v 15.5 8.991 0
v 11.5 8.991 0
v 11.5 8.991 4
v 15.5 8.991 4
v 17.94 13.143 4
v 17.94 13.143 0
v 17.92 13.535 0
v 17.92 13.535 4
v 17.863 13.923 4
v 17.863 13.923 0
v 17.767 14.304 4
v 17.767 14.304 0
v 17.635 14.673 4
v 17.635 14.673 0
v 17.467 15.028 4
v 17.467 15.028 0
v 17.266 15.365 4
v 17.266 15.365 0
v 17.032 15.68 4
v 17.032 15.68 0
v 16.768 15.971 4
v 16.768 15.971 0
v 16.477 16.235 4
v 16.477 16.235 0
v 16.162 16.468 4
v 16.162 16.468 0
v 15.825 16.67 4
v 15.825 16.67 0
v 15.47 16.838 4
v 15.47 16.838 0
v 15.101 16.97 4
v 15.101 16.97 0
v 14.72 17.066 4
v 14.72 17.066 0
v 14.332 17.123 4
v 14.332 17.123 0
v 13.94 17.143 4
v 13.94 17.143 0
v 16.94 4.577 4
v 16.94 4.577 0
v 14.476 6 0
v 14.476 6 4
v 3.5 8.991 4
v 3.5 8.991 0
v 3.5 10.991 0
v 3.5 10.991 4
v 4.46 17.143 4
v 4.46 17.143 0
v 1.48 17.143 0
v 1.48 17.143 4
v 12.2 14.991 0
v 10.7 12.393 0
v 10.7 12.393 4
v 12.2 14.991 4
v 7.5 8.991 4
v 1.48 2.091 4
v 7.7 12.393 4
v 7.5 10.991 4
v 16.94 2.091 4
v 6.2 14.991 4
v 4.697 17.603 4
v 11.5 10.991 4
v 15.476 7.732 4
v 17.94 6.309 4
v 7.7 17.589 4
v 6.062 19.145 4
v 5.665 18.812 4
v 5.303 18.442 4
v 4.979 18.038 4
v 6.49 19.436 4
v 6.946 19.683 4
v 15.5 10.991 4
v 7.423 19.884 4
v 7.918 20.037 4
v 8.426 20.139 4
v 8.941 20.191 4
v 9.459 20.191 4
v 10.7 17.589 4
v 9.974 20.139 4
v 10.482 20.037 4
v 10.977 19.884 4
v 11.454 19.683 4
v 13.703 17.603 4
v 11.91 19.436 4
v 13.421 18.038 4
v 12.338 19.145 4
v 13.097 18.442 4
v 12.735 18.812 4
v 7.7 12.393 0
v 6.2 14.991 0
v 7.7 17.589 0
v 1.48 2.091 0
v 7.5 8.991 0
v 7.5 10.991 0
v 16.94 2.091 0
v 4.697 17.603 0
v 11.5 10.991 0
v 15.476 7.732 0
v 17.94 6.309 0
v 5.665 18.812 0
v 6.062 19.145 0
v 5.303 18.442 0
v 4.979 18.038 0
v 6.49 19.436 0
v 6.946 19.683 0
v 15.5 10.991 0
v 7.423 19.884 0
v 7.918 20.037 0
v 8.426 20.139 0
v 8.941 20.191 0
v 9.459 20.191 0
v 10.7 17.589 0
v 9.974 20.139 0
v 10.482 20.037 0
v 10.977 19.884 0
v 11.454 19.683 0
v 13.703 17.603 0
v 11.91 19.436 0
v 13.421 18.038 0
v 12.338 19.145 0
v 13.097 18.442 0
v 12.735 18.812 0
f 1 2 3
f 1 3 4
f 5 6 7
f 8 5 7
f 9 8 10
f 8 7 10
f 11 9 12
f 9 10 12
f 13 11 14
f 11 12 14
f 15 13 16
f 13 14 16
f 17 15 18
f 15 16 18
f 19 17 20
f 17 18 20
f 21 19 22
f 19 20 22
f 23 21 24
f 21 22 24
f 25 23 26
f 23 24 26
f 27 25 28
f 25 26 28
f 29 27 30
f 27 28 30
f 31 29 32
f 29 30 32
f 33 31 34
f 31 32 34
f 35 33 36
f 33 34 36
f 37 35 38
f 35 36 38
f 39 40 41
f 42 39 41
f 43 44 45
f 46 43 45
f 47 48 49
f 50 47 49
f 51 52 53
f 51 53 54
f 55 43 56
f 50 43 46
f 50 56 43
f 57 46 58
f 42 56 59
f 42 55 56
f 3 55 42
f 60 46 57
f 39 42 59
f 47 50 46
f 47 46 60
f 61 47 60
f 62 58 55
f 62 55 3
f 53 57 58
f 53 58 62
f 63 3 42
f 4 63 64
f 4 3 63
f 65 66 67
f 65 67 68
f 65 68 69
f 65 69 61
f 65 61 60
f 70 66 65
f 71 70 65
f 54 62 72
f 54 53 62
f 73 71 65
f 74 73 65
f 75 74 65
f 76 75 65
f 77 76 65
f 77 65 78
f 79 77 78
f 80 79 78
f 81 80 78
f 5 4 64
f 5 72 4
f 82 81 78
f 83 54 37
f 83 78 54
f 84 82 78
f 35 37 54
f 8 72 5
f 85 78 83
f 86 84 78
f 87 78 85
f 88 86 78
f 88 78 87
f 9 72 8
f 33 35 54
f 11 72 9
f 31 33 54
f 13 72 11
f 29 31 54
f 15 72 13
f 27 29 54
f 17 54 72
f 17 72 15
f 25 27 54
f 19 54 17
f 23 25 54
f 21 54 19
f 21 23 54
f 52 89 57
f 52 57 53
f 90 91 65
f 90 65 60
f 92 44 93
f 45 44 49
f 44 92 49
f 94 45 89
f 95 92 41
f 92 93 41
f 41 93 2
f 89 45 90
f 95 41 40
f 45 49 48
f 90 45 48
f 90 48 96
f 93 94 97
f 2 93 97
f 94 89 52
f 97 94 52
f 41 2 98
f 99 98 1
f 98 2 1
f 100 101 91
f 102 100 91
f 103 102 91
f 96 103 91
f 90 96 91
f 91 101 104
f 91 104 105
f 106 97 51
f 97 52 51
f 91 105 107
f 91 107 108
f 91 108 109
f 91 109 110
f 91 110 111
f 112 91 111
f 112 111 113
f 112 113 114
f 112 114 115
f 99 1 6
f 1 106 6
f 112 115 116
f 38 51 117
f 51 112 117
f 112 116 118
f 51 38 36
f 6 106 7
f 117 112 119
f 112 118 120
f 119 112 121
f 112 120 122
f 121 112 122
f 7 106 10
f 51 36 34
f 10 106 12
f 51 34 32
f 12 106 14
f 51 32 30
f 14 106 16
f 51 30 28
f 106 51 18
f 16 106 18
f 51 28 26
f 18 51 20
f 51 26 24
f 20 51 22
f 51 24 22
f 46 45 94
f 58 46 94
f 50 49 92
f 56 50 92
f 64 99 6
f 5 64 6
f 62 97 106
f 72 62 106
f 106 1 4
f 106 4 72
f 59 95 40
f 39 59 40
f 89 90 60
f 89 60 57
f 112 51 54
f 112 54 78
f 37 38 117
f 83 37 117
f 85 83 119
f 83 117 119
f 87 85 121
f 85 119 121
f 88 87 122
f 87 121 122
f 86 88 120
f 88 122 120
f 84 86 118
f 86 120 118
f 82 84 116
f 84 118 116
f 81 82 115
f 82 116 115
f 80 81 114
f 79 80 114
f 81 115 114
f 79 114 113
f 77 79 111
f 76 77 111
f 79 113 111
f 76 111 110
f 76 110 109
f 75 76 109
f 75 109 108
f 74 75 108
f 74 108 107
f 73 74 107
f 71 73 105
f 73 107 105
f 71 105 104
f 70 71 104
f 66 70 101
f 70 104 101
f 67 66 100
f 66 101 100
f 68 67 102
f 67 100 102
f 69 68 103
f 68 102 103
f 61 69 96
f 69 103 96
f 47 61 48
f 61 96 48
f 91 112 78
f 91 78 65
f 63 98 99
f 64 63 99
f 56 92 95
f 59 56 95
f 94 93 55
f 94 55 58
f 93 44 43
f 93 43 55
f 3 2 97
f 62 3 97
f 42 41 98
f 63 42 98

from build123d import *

# Parameters (mm, degrees)
SKETCH1_W           = 4
SKETCH1_H           = 2
BOSS_EXTRUDE1_DEPTH = 4


with BuildPart() as part:
    # Sketch1 → Boss-Extrude1 (new body)
    with BuildSketch(Plane.XY):
        with BuildLine():
            Line((14.475572066, 6), (15.475572066, 7.732050808))
            Line((15.475572066, 7.732050808), (17.939673681, 6.309401077))
            Line((17.939673681, 6.309401077), (17.939673681, 13.142551265))
            ThreePointArc((17.939673681, 13.142551265), (16.768100806, 15.97097839), (13.939673681, 17.142551265))
            ThreePointArc((13.939673681, 17.142551265), (9.2, 20.197069168), (4.460326319, 17.142551265))
            Line((4.460326319, 17.142551265), (1.48, 17.142551265))
            Line((1.48, 17.142551265), (1.48, 2.09107808))
            Line((1.48, 2.09107808), (16.939673681, 2.09107808))
            Line((16.939673681, 2.09107808), (16.939673681, 4.577350269))
            Line((16.939673681, 4.577350269), (14.475572066, 6))
        make_face()
        with Locations((5.5, 9.99107808)):
            Rectangle(SKETCH1_W, SKETCH1_H, mode=Mode.SUBTRACT)
        with Locations((13.5, 9.99107808)):
            Rectangle(SKETCH1_W, SKETCH1_H, mode=Mode.SUBTRACT)
        Polygon((6.2, 14.99107808), (7.7, 12.393001869), (10.7, 12.393001869), (12.2, 14.99107808), (10.7, 17.589154291), (7.7, 17.589154291), align=None, mode=Mode.SUBTRACT)
    extrude(amount=BOSS_EXTRUDE1_DEPTH)


solid = part.part
